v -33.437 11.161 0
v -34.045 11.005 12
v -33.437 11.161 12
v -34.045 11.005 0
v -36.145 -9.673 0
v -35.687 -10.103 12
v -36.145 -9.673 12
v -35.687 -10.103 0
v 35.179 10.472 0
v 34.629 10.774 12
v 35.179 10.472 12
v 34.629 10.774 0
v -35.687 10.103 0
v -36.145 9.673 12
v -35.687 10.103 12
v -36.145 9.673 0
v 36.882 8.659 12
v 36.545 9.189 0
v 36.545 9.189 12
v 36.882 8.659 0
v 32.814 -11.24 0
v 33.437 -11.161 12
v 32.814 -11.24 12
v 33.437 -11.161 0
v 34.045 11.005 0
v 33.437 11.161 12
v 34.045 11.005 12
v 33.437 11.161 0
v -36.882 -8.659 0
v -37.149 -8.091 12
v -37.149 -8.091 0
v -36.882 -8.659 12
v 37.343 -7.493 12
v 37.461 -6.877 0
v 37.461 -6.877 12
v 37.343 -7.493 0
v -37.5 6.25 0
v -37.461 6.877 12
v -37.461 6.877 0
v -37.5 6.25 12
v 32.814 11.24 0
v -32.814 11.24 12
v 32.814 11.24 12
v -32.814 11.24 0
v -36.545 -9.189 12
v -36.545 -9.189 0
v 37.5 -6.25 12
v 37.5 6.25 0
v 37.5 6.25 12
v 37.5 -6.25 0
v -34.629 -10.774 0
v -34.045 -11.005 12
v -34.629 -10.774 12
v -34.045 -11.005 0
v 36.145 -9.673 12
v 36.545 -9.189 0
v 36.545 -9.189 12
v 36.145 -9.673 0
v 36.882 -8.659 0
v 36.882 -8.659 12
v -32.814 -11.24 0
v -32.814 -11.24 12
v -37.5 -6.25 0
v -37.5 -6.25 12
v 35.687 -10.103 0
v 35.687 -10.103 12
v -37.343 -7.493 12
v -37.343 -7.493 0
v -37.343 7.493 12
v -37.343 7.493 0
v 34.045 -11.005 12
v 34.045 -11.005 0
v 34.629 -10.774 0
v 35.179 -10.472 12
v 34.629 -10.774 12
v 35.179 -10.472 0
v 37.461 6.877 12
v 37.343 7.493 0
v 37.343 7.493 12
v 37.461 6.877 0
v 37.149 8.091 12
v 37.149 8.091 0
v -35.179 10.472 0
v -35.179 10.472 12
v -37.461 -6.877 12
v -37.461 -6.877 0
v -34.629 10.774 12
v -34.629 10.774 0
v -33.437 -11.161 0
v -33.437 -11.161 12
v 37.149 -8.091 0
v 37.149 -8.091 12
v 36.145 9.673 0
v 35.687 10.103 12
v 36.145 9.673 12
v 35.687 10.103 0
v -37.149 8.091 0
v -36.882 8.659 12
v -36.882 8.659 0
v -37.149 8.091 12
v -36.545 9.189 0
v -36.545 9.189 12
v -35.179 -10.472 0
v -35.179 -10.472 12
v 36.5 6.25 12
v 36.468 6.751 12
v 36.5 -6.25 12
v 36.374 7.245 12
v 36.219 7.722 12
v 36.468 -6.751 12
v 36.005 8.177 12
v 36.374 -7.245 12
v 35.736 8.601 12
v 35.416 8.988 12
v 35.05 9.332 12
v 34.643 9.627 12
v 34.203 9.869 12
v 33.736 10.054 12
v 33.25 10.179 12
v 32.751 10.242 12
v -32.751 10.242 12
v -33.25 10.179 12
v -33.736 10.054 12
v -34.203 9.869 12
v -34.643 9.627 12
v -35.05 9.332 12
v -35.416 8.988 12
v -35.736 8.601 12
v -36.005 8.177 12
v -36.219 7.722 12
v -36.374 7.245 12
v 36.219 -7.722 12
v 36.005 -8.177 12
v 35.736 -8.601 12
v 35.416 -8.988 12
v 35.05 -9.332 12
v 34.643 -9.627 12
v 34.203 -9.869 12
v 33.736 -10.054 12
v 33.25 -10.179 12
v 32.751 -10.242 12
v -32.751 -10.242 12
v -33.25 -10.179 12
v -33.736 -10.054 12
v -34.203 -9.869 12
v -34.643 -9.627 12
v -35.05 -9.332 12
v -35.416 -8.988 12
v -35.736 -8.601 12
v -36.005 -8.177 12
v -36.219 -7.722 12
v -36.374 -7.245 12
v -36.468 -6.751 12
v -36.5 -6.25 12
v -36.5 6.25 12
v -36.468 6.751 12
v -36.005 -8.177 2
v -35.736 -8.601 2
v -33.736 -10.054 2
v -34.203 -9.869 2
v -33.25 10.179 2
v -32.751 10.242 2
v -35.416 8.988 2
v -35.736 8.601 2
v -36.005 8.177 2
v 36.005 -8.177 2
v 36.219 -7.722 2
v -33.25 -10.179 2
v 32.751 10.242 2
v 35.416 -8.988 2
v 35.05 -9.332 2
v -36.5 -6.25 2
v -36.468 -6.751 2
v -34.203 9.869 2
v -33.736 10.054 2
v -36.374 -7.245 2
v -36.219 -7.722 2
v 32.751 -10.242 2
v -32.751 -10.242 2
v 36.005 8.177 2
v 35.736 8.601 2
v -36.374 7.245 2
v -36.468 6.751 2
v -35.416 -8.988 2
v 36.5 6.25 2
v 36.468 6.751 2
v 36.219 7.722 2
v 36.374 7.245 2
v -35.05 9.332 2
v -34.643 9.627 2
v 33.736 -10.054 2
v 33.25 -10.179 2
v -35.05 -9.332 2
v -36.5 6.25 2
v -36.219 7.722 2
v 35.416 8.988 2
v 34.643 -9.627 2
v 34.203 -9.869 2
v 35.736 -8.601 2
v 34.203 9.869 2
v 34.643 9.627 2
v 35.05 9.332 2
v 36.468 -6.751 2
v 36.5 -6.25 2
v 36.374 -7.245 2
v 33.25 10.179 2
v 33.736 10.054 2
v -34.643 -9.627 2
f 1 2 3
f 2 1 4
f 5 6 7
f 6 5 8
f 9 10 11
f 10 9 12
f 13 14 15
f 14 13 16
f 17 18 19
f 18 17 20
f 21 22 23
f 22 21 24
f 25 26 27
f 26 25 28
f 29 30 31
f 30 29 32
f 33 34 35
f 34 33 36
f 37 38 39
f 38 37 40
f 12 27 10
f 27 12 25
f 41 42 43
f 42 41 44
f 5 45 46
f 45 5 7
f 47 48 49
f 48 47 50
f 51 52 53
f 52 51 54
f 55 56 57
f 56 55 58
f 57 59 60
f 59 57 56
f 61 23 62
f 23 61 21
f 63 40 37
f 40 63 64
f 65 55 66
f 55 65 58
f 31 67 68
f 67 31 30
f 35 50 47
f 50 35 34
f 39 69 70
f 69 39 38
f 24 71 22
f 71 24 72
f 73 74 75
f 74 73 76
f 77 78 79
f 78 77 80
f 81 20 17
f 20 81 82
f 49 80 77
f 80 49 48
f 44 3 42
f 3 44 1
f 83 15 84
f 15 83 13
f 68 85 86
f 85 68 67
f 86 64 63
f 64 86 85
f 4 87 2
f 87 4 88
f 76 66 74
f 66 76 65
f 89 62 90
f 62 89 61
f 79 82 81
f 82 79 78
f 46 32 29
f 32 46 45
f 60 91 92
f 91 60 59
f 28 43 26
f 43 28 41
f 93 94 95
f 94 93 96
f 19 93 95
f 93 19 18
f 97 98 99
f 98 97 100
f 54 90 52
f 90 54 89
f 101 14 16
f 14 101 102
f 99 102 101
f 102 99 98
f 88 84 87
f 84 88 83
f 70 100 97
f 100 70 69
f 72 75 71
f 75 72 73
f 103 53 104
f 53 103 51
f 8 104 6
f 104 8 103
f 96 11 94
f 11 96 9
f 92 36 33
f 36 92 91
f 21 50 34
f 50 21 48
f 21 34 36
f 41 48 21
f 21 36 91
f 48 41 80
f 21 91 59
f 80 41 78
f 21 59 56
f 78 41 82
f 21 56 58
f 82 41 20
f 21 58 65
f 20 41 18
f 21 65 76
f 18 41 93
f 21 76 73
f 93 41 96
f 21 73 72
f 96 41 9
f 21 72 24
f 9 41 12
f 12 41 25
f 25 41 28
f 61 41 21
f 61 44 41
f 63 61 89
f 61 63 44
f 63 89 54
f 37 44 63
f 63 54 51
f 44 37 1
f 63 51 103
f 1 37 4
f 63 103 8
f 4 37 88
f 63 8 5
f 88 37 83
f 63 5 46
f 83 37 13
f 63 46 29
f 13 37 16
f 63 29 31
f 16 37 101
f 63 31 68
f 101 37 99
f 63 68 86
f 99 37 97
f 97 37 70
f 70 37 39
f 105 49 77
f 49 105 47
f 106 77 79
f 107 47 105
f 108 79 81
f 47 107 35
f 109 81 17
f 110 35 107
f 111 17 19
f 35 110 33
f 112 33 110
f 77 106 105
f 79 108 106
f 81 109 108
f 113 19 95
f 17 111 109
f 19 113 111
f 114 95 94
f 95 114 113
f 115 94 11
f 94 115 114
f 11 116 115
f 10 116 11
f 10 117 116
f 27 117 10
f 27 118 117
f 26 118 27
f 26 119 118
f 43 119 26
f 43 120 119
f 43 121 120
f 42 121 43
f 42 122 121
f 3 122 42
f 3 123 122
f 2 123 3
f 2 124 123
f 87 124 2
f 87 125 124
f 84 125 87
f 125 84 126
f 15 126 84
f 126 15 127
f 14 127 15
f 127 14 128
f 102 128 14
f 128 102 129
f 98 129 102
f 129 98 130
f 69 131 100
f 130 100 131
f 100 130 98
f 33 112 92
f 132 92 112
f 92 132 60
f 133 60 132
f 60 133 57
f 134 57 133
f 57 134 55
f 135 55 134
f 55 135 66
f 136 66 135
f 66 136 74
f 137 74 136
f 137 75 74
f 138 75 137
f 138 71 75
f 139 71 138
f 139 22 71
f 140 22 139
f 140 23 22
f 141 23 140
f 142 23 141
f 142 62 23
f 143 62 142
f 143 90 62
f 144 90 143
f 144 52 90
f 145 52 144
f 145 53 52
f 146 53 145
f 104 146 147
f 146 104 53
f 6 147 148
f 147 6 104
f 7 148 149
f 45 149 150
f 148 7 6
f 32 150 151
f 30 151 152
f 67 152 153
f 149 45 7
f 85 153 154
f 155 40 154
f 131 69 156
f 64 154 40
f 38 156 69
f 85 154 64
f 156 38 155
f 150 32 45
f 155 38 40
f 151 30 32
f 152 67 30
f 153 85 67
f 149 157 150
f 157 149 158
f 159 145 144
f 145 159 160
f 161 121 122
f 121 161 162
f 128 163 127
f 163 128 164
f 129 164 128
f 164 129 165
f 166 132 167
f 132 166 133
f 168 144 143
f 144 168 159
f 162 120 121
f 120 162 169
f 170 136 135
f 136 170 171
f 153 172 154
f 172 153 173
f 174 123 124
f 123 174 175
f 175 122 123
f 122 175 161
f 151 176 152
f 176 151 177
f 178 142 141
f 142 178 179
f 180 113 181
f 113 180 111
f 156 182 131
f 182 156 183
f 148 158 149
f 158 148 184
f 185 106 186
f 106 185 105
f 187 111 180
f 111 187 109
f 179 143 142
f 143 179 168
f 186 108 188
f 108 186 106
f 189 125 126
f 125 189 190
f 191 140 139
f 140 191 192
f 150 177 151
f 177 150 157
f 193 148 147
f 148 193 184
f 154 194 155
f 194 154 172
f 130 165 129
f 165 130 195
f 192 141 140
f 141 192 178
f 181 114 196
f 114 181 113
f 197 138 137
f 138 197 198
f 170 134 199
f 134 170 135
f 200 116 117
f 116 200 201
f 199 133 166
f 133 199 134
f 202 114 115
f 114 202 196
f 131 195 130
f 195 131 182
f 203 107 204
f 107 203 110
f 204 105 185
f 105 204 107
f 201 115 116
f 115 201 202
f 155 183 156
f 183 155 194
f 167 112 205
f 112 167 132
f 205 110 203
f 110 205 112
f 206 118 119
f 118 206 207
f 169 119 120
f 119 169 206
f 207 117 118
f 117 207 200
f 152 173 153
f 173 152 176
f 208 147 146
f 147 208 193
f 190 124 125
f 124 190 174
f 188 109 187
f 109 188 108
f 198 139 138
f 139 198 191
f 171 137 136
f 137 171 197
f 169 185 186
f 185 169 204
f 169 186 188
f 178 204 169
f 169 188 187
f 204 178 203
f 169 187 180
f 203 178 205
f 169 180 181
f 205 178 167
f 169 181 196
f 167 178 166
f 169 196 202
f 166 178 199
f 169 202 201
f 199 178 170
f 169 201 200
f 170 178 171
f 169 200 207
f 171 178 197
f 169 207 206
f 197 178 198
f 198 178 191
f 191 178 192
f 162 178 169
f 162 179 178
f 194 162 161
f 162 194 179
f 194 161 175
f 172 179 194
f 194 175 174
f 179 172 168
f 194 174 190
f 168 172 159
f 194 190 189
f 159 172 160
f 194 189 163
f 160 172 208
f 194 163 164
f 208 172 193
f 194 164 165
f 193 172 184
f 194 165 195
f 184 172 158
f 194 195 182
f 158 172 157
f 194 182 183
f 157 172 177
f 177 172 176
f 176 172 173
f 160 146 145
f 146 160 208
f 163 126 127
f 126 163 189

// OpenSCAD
$fn = 50;


difference() {
	union() {
		hull() {
			translate(v = [-32.5000000000, 6.2500000000, 0]) {
				cylinder(h = 12, r = 5);
			}
			translate(v = [32.5000000000, 6.2500000000, 0]) {
				cylinder(h = 12, r = 5);
			}
			translate(v = [-32.5000000000, -6.2500000000, 0]) {
				cylinder(h = 12, r = 5);
			}
			translate(v = [32.5000000000, -6.2500000000, 0]) {
				cylinder(h = 12, r = 5);
			}
		}
	}
	union() {
		translate(v = [0, 0, 2]) {
			hull() {
				translate(v = [-32.5000000000, 6.2500000000, 0]) {
					cylinder(h = 10, r = 4);
				}
				translate(v = [32.5000000000, 6.2500000000, 0]) {
					cylinder(h = 10, r = 4);
				}
				translate(v = [-32.5000000000, -6.2500000000, 0]) {
					cylinder(h = 10, r = 4);
				}
				translate(v = [32.5000000000, -6.2500000000, 0]) {
					cylinder(h = 10, r = 4);
				}
			}
		}
	}
}
